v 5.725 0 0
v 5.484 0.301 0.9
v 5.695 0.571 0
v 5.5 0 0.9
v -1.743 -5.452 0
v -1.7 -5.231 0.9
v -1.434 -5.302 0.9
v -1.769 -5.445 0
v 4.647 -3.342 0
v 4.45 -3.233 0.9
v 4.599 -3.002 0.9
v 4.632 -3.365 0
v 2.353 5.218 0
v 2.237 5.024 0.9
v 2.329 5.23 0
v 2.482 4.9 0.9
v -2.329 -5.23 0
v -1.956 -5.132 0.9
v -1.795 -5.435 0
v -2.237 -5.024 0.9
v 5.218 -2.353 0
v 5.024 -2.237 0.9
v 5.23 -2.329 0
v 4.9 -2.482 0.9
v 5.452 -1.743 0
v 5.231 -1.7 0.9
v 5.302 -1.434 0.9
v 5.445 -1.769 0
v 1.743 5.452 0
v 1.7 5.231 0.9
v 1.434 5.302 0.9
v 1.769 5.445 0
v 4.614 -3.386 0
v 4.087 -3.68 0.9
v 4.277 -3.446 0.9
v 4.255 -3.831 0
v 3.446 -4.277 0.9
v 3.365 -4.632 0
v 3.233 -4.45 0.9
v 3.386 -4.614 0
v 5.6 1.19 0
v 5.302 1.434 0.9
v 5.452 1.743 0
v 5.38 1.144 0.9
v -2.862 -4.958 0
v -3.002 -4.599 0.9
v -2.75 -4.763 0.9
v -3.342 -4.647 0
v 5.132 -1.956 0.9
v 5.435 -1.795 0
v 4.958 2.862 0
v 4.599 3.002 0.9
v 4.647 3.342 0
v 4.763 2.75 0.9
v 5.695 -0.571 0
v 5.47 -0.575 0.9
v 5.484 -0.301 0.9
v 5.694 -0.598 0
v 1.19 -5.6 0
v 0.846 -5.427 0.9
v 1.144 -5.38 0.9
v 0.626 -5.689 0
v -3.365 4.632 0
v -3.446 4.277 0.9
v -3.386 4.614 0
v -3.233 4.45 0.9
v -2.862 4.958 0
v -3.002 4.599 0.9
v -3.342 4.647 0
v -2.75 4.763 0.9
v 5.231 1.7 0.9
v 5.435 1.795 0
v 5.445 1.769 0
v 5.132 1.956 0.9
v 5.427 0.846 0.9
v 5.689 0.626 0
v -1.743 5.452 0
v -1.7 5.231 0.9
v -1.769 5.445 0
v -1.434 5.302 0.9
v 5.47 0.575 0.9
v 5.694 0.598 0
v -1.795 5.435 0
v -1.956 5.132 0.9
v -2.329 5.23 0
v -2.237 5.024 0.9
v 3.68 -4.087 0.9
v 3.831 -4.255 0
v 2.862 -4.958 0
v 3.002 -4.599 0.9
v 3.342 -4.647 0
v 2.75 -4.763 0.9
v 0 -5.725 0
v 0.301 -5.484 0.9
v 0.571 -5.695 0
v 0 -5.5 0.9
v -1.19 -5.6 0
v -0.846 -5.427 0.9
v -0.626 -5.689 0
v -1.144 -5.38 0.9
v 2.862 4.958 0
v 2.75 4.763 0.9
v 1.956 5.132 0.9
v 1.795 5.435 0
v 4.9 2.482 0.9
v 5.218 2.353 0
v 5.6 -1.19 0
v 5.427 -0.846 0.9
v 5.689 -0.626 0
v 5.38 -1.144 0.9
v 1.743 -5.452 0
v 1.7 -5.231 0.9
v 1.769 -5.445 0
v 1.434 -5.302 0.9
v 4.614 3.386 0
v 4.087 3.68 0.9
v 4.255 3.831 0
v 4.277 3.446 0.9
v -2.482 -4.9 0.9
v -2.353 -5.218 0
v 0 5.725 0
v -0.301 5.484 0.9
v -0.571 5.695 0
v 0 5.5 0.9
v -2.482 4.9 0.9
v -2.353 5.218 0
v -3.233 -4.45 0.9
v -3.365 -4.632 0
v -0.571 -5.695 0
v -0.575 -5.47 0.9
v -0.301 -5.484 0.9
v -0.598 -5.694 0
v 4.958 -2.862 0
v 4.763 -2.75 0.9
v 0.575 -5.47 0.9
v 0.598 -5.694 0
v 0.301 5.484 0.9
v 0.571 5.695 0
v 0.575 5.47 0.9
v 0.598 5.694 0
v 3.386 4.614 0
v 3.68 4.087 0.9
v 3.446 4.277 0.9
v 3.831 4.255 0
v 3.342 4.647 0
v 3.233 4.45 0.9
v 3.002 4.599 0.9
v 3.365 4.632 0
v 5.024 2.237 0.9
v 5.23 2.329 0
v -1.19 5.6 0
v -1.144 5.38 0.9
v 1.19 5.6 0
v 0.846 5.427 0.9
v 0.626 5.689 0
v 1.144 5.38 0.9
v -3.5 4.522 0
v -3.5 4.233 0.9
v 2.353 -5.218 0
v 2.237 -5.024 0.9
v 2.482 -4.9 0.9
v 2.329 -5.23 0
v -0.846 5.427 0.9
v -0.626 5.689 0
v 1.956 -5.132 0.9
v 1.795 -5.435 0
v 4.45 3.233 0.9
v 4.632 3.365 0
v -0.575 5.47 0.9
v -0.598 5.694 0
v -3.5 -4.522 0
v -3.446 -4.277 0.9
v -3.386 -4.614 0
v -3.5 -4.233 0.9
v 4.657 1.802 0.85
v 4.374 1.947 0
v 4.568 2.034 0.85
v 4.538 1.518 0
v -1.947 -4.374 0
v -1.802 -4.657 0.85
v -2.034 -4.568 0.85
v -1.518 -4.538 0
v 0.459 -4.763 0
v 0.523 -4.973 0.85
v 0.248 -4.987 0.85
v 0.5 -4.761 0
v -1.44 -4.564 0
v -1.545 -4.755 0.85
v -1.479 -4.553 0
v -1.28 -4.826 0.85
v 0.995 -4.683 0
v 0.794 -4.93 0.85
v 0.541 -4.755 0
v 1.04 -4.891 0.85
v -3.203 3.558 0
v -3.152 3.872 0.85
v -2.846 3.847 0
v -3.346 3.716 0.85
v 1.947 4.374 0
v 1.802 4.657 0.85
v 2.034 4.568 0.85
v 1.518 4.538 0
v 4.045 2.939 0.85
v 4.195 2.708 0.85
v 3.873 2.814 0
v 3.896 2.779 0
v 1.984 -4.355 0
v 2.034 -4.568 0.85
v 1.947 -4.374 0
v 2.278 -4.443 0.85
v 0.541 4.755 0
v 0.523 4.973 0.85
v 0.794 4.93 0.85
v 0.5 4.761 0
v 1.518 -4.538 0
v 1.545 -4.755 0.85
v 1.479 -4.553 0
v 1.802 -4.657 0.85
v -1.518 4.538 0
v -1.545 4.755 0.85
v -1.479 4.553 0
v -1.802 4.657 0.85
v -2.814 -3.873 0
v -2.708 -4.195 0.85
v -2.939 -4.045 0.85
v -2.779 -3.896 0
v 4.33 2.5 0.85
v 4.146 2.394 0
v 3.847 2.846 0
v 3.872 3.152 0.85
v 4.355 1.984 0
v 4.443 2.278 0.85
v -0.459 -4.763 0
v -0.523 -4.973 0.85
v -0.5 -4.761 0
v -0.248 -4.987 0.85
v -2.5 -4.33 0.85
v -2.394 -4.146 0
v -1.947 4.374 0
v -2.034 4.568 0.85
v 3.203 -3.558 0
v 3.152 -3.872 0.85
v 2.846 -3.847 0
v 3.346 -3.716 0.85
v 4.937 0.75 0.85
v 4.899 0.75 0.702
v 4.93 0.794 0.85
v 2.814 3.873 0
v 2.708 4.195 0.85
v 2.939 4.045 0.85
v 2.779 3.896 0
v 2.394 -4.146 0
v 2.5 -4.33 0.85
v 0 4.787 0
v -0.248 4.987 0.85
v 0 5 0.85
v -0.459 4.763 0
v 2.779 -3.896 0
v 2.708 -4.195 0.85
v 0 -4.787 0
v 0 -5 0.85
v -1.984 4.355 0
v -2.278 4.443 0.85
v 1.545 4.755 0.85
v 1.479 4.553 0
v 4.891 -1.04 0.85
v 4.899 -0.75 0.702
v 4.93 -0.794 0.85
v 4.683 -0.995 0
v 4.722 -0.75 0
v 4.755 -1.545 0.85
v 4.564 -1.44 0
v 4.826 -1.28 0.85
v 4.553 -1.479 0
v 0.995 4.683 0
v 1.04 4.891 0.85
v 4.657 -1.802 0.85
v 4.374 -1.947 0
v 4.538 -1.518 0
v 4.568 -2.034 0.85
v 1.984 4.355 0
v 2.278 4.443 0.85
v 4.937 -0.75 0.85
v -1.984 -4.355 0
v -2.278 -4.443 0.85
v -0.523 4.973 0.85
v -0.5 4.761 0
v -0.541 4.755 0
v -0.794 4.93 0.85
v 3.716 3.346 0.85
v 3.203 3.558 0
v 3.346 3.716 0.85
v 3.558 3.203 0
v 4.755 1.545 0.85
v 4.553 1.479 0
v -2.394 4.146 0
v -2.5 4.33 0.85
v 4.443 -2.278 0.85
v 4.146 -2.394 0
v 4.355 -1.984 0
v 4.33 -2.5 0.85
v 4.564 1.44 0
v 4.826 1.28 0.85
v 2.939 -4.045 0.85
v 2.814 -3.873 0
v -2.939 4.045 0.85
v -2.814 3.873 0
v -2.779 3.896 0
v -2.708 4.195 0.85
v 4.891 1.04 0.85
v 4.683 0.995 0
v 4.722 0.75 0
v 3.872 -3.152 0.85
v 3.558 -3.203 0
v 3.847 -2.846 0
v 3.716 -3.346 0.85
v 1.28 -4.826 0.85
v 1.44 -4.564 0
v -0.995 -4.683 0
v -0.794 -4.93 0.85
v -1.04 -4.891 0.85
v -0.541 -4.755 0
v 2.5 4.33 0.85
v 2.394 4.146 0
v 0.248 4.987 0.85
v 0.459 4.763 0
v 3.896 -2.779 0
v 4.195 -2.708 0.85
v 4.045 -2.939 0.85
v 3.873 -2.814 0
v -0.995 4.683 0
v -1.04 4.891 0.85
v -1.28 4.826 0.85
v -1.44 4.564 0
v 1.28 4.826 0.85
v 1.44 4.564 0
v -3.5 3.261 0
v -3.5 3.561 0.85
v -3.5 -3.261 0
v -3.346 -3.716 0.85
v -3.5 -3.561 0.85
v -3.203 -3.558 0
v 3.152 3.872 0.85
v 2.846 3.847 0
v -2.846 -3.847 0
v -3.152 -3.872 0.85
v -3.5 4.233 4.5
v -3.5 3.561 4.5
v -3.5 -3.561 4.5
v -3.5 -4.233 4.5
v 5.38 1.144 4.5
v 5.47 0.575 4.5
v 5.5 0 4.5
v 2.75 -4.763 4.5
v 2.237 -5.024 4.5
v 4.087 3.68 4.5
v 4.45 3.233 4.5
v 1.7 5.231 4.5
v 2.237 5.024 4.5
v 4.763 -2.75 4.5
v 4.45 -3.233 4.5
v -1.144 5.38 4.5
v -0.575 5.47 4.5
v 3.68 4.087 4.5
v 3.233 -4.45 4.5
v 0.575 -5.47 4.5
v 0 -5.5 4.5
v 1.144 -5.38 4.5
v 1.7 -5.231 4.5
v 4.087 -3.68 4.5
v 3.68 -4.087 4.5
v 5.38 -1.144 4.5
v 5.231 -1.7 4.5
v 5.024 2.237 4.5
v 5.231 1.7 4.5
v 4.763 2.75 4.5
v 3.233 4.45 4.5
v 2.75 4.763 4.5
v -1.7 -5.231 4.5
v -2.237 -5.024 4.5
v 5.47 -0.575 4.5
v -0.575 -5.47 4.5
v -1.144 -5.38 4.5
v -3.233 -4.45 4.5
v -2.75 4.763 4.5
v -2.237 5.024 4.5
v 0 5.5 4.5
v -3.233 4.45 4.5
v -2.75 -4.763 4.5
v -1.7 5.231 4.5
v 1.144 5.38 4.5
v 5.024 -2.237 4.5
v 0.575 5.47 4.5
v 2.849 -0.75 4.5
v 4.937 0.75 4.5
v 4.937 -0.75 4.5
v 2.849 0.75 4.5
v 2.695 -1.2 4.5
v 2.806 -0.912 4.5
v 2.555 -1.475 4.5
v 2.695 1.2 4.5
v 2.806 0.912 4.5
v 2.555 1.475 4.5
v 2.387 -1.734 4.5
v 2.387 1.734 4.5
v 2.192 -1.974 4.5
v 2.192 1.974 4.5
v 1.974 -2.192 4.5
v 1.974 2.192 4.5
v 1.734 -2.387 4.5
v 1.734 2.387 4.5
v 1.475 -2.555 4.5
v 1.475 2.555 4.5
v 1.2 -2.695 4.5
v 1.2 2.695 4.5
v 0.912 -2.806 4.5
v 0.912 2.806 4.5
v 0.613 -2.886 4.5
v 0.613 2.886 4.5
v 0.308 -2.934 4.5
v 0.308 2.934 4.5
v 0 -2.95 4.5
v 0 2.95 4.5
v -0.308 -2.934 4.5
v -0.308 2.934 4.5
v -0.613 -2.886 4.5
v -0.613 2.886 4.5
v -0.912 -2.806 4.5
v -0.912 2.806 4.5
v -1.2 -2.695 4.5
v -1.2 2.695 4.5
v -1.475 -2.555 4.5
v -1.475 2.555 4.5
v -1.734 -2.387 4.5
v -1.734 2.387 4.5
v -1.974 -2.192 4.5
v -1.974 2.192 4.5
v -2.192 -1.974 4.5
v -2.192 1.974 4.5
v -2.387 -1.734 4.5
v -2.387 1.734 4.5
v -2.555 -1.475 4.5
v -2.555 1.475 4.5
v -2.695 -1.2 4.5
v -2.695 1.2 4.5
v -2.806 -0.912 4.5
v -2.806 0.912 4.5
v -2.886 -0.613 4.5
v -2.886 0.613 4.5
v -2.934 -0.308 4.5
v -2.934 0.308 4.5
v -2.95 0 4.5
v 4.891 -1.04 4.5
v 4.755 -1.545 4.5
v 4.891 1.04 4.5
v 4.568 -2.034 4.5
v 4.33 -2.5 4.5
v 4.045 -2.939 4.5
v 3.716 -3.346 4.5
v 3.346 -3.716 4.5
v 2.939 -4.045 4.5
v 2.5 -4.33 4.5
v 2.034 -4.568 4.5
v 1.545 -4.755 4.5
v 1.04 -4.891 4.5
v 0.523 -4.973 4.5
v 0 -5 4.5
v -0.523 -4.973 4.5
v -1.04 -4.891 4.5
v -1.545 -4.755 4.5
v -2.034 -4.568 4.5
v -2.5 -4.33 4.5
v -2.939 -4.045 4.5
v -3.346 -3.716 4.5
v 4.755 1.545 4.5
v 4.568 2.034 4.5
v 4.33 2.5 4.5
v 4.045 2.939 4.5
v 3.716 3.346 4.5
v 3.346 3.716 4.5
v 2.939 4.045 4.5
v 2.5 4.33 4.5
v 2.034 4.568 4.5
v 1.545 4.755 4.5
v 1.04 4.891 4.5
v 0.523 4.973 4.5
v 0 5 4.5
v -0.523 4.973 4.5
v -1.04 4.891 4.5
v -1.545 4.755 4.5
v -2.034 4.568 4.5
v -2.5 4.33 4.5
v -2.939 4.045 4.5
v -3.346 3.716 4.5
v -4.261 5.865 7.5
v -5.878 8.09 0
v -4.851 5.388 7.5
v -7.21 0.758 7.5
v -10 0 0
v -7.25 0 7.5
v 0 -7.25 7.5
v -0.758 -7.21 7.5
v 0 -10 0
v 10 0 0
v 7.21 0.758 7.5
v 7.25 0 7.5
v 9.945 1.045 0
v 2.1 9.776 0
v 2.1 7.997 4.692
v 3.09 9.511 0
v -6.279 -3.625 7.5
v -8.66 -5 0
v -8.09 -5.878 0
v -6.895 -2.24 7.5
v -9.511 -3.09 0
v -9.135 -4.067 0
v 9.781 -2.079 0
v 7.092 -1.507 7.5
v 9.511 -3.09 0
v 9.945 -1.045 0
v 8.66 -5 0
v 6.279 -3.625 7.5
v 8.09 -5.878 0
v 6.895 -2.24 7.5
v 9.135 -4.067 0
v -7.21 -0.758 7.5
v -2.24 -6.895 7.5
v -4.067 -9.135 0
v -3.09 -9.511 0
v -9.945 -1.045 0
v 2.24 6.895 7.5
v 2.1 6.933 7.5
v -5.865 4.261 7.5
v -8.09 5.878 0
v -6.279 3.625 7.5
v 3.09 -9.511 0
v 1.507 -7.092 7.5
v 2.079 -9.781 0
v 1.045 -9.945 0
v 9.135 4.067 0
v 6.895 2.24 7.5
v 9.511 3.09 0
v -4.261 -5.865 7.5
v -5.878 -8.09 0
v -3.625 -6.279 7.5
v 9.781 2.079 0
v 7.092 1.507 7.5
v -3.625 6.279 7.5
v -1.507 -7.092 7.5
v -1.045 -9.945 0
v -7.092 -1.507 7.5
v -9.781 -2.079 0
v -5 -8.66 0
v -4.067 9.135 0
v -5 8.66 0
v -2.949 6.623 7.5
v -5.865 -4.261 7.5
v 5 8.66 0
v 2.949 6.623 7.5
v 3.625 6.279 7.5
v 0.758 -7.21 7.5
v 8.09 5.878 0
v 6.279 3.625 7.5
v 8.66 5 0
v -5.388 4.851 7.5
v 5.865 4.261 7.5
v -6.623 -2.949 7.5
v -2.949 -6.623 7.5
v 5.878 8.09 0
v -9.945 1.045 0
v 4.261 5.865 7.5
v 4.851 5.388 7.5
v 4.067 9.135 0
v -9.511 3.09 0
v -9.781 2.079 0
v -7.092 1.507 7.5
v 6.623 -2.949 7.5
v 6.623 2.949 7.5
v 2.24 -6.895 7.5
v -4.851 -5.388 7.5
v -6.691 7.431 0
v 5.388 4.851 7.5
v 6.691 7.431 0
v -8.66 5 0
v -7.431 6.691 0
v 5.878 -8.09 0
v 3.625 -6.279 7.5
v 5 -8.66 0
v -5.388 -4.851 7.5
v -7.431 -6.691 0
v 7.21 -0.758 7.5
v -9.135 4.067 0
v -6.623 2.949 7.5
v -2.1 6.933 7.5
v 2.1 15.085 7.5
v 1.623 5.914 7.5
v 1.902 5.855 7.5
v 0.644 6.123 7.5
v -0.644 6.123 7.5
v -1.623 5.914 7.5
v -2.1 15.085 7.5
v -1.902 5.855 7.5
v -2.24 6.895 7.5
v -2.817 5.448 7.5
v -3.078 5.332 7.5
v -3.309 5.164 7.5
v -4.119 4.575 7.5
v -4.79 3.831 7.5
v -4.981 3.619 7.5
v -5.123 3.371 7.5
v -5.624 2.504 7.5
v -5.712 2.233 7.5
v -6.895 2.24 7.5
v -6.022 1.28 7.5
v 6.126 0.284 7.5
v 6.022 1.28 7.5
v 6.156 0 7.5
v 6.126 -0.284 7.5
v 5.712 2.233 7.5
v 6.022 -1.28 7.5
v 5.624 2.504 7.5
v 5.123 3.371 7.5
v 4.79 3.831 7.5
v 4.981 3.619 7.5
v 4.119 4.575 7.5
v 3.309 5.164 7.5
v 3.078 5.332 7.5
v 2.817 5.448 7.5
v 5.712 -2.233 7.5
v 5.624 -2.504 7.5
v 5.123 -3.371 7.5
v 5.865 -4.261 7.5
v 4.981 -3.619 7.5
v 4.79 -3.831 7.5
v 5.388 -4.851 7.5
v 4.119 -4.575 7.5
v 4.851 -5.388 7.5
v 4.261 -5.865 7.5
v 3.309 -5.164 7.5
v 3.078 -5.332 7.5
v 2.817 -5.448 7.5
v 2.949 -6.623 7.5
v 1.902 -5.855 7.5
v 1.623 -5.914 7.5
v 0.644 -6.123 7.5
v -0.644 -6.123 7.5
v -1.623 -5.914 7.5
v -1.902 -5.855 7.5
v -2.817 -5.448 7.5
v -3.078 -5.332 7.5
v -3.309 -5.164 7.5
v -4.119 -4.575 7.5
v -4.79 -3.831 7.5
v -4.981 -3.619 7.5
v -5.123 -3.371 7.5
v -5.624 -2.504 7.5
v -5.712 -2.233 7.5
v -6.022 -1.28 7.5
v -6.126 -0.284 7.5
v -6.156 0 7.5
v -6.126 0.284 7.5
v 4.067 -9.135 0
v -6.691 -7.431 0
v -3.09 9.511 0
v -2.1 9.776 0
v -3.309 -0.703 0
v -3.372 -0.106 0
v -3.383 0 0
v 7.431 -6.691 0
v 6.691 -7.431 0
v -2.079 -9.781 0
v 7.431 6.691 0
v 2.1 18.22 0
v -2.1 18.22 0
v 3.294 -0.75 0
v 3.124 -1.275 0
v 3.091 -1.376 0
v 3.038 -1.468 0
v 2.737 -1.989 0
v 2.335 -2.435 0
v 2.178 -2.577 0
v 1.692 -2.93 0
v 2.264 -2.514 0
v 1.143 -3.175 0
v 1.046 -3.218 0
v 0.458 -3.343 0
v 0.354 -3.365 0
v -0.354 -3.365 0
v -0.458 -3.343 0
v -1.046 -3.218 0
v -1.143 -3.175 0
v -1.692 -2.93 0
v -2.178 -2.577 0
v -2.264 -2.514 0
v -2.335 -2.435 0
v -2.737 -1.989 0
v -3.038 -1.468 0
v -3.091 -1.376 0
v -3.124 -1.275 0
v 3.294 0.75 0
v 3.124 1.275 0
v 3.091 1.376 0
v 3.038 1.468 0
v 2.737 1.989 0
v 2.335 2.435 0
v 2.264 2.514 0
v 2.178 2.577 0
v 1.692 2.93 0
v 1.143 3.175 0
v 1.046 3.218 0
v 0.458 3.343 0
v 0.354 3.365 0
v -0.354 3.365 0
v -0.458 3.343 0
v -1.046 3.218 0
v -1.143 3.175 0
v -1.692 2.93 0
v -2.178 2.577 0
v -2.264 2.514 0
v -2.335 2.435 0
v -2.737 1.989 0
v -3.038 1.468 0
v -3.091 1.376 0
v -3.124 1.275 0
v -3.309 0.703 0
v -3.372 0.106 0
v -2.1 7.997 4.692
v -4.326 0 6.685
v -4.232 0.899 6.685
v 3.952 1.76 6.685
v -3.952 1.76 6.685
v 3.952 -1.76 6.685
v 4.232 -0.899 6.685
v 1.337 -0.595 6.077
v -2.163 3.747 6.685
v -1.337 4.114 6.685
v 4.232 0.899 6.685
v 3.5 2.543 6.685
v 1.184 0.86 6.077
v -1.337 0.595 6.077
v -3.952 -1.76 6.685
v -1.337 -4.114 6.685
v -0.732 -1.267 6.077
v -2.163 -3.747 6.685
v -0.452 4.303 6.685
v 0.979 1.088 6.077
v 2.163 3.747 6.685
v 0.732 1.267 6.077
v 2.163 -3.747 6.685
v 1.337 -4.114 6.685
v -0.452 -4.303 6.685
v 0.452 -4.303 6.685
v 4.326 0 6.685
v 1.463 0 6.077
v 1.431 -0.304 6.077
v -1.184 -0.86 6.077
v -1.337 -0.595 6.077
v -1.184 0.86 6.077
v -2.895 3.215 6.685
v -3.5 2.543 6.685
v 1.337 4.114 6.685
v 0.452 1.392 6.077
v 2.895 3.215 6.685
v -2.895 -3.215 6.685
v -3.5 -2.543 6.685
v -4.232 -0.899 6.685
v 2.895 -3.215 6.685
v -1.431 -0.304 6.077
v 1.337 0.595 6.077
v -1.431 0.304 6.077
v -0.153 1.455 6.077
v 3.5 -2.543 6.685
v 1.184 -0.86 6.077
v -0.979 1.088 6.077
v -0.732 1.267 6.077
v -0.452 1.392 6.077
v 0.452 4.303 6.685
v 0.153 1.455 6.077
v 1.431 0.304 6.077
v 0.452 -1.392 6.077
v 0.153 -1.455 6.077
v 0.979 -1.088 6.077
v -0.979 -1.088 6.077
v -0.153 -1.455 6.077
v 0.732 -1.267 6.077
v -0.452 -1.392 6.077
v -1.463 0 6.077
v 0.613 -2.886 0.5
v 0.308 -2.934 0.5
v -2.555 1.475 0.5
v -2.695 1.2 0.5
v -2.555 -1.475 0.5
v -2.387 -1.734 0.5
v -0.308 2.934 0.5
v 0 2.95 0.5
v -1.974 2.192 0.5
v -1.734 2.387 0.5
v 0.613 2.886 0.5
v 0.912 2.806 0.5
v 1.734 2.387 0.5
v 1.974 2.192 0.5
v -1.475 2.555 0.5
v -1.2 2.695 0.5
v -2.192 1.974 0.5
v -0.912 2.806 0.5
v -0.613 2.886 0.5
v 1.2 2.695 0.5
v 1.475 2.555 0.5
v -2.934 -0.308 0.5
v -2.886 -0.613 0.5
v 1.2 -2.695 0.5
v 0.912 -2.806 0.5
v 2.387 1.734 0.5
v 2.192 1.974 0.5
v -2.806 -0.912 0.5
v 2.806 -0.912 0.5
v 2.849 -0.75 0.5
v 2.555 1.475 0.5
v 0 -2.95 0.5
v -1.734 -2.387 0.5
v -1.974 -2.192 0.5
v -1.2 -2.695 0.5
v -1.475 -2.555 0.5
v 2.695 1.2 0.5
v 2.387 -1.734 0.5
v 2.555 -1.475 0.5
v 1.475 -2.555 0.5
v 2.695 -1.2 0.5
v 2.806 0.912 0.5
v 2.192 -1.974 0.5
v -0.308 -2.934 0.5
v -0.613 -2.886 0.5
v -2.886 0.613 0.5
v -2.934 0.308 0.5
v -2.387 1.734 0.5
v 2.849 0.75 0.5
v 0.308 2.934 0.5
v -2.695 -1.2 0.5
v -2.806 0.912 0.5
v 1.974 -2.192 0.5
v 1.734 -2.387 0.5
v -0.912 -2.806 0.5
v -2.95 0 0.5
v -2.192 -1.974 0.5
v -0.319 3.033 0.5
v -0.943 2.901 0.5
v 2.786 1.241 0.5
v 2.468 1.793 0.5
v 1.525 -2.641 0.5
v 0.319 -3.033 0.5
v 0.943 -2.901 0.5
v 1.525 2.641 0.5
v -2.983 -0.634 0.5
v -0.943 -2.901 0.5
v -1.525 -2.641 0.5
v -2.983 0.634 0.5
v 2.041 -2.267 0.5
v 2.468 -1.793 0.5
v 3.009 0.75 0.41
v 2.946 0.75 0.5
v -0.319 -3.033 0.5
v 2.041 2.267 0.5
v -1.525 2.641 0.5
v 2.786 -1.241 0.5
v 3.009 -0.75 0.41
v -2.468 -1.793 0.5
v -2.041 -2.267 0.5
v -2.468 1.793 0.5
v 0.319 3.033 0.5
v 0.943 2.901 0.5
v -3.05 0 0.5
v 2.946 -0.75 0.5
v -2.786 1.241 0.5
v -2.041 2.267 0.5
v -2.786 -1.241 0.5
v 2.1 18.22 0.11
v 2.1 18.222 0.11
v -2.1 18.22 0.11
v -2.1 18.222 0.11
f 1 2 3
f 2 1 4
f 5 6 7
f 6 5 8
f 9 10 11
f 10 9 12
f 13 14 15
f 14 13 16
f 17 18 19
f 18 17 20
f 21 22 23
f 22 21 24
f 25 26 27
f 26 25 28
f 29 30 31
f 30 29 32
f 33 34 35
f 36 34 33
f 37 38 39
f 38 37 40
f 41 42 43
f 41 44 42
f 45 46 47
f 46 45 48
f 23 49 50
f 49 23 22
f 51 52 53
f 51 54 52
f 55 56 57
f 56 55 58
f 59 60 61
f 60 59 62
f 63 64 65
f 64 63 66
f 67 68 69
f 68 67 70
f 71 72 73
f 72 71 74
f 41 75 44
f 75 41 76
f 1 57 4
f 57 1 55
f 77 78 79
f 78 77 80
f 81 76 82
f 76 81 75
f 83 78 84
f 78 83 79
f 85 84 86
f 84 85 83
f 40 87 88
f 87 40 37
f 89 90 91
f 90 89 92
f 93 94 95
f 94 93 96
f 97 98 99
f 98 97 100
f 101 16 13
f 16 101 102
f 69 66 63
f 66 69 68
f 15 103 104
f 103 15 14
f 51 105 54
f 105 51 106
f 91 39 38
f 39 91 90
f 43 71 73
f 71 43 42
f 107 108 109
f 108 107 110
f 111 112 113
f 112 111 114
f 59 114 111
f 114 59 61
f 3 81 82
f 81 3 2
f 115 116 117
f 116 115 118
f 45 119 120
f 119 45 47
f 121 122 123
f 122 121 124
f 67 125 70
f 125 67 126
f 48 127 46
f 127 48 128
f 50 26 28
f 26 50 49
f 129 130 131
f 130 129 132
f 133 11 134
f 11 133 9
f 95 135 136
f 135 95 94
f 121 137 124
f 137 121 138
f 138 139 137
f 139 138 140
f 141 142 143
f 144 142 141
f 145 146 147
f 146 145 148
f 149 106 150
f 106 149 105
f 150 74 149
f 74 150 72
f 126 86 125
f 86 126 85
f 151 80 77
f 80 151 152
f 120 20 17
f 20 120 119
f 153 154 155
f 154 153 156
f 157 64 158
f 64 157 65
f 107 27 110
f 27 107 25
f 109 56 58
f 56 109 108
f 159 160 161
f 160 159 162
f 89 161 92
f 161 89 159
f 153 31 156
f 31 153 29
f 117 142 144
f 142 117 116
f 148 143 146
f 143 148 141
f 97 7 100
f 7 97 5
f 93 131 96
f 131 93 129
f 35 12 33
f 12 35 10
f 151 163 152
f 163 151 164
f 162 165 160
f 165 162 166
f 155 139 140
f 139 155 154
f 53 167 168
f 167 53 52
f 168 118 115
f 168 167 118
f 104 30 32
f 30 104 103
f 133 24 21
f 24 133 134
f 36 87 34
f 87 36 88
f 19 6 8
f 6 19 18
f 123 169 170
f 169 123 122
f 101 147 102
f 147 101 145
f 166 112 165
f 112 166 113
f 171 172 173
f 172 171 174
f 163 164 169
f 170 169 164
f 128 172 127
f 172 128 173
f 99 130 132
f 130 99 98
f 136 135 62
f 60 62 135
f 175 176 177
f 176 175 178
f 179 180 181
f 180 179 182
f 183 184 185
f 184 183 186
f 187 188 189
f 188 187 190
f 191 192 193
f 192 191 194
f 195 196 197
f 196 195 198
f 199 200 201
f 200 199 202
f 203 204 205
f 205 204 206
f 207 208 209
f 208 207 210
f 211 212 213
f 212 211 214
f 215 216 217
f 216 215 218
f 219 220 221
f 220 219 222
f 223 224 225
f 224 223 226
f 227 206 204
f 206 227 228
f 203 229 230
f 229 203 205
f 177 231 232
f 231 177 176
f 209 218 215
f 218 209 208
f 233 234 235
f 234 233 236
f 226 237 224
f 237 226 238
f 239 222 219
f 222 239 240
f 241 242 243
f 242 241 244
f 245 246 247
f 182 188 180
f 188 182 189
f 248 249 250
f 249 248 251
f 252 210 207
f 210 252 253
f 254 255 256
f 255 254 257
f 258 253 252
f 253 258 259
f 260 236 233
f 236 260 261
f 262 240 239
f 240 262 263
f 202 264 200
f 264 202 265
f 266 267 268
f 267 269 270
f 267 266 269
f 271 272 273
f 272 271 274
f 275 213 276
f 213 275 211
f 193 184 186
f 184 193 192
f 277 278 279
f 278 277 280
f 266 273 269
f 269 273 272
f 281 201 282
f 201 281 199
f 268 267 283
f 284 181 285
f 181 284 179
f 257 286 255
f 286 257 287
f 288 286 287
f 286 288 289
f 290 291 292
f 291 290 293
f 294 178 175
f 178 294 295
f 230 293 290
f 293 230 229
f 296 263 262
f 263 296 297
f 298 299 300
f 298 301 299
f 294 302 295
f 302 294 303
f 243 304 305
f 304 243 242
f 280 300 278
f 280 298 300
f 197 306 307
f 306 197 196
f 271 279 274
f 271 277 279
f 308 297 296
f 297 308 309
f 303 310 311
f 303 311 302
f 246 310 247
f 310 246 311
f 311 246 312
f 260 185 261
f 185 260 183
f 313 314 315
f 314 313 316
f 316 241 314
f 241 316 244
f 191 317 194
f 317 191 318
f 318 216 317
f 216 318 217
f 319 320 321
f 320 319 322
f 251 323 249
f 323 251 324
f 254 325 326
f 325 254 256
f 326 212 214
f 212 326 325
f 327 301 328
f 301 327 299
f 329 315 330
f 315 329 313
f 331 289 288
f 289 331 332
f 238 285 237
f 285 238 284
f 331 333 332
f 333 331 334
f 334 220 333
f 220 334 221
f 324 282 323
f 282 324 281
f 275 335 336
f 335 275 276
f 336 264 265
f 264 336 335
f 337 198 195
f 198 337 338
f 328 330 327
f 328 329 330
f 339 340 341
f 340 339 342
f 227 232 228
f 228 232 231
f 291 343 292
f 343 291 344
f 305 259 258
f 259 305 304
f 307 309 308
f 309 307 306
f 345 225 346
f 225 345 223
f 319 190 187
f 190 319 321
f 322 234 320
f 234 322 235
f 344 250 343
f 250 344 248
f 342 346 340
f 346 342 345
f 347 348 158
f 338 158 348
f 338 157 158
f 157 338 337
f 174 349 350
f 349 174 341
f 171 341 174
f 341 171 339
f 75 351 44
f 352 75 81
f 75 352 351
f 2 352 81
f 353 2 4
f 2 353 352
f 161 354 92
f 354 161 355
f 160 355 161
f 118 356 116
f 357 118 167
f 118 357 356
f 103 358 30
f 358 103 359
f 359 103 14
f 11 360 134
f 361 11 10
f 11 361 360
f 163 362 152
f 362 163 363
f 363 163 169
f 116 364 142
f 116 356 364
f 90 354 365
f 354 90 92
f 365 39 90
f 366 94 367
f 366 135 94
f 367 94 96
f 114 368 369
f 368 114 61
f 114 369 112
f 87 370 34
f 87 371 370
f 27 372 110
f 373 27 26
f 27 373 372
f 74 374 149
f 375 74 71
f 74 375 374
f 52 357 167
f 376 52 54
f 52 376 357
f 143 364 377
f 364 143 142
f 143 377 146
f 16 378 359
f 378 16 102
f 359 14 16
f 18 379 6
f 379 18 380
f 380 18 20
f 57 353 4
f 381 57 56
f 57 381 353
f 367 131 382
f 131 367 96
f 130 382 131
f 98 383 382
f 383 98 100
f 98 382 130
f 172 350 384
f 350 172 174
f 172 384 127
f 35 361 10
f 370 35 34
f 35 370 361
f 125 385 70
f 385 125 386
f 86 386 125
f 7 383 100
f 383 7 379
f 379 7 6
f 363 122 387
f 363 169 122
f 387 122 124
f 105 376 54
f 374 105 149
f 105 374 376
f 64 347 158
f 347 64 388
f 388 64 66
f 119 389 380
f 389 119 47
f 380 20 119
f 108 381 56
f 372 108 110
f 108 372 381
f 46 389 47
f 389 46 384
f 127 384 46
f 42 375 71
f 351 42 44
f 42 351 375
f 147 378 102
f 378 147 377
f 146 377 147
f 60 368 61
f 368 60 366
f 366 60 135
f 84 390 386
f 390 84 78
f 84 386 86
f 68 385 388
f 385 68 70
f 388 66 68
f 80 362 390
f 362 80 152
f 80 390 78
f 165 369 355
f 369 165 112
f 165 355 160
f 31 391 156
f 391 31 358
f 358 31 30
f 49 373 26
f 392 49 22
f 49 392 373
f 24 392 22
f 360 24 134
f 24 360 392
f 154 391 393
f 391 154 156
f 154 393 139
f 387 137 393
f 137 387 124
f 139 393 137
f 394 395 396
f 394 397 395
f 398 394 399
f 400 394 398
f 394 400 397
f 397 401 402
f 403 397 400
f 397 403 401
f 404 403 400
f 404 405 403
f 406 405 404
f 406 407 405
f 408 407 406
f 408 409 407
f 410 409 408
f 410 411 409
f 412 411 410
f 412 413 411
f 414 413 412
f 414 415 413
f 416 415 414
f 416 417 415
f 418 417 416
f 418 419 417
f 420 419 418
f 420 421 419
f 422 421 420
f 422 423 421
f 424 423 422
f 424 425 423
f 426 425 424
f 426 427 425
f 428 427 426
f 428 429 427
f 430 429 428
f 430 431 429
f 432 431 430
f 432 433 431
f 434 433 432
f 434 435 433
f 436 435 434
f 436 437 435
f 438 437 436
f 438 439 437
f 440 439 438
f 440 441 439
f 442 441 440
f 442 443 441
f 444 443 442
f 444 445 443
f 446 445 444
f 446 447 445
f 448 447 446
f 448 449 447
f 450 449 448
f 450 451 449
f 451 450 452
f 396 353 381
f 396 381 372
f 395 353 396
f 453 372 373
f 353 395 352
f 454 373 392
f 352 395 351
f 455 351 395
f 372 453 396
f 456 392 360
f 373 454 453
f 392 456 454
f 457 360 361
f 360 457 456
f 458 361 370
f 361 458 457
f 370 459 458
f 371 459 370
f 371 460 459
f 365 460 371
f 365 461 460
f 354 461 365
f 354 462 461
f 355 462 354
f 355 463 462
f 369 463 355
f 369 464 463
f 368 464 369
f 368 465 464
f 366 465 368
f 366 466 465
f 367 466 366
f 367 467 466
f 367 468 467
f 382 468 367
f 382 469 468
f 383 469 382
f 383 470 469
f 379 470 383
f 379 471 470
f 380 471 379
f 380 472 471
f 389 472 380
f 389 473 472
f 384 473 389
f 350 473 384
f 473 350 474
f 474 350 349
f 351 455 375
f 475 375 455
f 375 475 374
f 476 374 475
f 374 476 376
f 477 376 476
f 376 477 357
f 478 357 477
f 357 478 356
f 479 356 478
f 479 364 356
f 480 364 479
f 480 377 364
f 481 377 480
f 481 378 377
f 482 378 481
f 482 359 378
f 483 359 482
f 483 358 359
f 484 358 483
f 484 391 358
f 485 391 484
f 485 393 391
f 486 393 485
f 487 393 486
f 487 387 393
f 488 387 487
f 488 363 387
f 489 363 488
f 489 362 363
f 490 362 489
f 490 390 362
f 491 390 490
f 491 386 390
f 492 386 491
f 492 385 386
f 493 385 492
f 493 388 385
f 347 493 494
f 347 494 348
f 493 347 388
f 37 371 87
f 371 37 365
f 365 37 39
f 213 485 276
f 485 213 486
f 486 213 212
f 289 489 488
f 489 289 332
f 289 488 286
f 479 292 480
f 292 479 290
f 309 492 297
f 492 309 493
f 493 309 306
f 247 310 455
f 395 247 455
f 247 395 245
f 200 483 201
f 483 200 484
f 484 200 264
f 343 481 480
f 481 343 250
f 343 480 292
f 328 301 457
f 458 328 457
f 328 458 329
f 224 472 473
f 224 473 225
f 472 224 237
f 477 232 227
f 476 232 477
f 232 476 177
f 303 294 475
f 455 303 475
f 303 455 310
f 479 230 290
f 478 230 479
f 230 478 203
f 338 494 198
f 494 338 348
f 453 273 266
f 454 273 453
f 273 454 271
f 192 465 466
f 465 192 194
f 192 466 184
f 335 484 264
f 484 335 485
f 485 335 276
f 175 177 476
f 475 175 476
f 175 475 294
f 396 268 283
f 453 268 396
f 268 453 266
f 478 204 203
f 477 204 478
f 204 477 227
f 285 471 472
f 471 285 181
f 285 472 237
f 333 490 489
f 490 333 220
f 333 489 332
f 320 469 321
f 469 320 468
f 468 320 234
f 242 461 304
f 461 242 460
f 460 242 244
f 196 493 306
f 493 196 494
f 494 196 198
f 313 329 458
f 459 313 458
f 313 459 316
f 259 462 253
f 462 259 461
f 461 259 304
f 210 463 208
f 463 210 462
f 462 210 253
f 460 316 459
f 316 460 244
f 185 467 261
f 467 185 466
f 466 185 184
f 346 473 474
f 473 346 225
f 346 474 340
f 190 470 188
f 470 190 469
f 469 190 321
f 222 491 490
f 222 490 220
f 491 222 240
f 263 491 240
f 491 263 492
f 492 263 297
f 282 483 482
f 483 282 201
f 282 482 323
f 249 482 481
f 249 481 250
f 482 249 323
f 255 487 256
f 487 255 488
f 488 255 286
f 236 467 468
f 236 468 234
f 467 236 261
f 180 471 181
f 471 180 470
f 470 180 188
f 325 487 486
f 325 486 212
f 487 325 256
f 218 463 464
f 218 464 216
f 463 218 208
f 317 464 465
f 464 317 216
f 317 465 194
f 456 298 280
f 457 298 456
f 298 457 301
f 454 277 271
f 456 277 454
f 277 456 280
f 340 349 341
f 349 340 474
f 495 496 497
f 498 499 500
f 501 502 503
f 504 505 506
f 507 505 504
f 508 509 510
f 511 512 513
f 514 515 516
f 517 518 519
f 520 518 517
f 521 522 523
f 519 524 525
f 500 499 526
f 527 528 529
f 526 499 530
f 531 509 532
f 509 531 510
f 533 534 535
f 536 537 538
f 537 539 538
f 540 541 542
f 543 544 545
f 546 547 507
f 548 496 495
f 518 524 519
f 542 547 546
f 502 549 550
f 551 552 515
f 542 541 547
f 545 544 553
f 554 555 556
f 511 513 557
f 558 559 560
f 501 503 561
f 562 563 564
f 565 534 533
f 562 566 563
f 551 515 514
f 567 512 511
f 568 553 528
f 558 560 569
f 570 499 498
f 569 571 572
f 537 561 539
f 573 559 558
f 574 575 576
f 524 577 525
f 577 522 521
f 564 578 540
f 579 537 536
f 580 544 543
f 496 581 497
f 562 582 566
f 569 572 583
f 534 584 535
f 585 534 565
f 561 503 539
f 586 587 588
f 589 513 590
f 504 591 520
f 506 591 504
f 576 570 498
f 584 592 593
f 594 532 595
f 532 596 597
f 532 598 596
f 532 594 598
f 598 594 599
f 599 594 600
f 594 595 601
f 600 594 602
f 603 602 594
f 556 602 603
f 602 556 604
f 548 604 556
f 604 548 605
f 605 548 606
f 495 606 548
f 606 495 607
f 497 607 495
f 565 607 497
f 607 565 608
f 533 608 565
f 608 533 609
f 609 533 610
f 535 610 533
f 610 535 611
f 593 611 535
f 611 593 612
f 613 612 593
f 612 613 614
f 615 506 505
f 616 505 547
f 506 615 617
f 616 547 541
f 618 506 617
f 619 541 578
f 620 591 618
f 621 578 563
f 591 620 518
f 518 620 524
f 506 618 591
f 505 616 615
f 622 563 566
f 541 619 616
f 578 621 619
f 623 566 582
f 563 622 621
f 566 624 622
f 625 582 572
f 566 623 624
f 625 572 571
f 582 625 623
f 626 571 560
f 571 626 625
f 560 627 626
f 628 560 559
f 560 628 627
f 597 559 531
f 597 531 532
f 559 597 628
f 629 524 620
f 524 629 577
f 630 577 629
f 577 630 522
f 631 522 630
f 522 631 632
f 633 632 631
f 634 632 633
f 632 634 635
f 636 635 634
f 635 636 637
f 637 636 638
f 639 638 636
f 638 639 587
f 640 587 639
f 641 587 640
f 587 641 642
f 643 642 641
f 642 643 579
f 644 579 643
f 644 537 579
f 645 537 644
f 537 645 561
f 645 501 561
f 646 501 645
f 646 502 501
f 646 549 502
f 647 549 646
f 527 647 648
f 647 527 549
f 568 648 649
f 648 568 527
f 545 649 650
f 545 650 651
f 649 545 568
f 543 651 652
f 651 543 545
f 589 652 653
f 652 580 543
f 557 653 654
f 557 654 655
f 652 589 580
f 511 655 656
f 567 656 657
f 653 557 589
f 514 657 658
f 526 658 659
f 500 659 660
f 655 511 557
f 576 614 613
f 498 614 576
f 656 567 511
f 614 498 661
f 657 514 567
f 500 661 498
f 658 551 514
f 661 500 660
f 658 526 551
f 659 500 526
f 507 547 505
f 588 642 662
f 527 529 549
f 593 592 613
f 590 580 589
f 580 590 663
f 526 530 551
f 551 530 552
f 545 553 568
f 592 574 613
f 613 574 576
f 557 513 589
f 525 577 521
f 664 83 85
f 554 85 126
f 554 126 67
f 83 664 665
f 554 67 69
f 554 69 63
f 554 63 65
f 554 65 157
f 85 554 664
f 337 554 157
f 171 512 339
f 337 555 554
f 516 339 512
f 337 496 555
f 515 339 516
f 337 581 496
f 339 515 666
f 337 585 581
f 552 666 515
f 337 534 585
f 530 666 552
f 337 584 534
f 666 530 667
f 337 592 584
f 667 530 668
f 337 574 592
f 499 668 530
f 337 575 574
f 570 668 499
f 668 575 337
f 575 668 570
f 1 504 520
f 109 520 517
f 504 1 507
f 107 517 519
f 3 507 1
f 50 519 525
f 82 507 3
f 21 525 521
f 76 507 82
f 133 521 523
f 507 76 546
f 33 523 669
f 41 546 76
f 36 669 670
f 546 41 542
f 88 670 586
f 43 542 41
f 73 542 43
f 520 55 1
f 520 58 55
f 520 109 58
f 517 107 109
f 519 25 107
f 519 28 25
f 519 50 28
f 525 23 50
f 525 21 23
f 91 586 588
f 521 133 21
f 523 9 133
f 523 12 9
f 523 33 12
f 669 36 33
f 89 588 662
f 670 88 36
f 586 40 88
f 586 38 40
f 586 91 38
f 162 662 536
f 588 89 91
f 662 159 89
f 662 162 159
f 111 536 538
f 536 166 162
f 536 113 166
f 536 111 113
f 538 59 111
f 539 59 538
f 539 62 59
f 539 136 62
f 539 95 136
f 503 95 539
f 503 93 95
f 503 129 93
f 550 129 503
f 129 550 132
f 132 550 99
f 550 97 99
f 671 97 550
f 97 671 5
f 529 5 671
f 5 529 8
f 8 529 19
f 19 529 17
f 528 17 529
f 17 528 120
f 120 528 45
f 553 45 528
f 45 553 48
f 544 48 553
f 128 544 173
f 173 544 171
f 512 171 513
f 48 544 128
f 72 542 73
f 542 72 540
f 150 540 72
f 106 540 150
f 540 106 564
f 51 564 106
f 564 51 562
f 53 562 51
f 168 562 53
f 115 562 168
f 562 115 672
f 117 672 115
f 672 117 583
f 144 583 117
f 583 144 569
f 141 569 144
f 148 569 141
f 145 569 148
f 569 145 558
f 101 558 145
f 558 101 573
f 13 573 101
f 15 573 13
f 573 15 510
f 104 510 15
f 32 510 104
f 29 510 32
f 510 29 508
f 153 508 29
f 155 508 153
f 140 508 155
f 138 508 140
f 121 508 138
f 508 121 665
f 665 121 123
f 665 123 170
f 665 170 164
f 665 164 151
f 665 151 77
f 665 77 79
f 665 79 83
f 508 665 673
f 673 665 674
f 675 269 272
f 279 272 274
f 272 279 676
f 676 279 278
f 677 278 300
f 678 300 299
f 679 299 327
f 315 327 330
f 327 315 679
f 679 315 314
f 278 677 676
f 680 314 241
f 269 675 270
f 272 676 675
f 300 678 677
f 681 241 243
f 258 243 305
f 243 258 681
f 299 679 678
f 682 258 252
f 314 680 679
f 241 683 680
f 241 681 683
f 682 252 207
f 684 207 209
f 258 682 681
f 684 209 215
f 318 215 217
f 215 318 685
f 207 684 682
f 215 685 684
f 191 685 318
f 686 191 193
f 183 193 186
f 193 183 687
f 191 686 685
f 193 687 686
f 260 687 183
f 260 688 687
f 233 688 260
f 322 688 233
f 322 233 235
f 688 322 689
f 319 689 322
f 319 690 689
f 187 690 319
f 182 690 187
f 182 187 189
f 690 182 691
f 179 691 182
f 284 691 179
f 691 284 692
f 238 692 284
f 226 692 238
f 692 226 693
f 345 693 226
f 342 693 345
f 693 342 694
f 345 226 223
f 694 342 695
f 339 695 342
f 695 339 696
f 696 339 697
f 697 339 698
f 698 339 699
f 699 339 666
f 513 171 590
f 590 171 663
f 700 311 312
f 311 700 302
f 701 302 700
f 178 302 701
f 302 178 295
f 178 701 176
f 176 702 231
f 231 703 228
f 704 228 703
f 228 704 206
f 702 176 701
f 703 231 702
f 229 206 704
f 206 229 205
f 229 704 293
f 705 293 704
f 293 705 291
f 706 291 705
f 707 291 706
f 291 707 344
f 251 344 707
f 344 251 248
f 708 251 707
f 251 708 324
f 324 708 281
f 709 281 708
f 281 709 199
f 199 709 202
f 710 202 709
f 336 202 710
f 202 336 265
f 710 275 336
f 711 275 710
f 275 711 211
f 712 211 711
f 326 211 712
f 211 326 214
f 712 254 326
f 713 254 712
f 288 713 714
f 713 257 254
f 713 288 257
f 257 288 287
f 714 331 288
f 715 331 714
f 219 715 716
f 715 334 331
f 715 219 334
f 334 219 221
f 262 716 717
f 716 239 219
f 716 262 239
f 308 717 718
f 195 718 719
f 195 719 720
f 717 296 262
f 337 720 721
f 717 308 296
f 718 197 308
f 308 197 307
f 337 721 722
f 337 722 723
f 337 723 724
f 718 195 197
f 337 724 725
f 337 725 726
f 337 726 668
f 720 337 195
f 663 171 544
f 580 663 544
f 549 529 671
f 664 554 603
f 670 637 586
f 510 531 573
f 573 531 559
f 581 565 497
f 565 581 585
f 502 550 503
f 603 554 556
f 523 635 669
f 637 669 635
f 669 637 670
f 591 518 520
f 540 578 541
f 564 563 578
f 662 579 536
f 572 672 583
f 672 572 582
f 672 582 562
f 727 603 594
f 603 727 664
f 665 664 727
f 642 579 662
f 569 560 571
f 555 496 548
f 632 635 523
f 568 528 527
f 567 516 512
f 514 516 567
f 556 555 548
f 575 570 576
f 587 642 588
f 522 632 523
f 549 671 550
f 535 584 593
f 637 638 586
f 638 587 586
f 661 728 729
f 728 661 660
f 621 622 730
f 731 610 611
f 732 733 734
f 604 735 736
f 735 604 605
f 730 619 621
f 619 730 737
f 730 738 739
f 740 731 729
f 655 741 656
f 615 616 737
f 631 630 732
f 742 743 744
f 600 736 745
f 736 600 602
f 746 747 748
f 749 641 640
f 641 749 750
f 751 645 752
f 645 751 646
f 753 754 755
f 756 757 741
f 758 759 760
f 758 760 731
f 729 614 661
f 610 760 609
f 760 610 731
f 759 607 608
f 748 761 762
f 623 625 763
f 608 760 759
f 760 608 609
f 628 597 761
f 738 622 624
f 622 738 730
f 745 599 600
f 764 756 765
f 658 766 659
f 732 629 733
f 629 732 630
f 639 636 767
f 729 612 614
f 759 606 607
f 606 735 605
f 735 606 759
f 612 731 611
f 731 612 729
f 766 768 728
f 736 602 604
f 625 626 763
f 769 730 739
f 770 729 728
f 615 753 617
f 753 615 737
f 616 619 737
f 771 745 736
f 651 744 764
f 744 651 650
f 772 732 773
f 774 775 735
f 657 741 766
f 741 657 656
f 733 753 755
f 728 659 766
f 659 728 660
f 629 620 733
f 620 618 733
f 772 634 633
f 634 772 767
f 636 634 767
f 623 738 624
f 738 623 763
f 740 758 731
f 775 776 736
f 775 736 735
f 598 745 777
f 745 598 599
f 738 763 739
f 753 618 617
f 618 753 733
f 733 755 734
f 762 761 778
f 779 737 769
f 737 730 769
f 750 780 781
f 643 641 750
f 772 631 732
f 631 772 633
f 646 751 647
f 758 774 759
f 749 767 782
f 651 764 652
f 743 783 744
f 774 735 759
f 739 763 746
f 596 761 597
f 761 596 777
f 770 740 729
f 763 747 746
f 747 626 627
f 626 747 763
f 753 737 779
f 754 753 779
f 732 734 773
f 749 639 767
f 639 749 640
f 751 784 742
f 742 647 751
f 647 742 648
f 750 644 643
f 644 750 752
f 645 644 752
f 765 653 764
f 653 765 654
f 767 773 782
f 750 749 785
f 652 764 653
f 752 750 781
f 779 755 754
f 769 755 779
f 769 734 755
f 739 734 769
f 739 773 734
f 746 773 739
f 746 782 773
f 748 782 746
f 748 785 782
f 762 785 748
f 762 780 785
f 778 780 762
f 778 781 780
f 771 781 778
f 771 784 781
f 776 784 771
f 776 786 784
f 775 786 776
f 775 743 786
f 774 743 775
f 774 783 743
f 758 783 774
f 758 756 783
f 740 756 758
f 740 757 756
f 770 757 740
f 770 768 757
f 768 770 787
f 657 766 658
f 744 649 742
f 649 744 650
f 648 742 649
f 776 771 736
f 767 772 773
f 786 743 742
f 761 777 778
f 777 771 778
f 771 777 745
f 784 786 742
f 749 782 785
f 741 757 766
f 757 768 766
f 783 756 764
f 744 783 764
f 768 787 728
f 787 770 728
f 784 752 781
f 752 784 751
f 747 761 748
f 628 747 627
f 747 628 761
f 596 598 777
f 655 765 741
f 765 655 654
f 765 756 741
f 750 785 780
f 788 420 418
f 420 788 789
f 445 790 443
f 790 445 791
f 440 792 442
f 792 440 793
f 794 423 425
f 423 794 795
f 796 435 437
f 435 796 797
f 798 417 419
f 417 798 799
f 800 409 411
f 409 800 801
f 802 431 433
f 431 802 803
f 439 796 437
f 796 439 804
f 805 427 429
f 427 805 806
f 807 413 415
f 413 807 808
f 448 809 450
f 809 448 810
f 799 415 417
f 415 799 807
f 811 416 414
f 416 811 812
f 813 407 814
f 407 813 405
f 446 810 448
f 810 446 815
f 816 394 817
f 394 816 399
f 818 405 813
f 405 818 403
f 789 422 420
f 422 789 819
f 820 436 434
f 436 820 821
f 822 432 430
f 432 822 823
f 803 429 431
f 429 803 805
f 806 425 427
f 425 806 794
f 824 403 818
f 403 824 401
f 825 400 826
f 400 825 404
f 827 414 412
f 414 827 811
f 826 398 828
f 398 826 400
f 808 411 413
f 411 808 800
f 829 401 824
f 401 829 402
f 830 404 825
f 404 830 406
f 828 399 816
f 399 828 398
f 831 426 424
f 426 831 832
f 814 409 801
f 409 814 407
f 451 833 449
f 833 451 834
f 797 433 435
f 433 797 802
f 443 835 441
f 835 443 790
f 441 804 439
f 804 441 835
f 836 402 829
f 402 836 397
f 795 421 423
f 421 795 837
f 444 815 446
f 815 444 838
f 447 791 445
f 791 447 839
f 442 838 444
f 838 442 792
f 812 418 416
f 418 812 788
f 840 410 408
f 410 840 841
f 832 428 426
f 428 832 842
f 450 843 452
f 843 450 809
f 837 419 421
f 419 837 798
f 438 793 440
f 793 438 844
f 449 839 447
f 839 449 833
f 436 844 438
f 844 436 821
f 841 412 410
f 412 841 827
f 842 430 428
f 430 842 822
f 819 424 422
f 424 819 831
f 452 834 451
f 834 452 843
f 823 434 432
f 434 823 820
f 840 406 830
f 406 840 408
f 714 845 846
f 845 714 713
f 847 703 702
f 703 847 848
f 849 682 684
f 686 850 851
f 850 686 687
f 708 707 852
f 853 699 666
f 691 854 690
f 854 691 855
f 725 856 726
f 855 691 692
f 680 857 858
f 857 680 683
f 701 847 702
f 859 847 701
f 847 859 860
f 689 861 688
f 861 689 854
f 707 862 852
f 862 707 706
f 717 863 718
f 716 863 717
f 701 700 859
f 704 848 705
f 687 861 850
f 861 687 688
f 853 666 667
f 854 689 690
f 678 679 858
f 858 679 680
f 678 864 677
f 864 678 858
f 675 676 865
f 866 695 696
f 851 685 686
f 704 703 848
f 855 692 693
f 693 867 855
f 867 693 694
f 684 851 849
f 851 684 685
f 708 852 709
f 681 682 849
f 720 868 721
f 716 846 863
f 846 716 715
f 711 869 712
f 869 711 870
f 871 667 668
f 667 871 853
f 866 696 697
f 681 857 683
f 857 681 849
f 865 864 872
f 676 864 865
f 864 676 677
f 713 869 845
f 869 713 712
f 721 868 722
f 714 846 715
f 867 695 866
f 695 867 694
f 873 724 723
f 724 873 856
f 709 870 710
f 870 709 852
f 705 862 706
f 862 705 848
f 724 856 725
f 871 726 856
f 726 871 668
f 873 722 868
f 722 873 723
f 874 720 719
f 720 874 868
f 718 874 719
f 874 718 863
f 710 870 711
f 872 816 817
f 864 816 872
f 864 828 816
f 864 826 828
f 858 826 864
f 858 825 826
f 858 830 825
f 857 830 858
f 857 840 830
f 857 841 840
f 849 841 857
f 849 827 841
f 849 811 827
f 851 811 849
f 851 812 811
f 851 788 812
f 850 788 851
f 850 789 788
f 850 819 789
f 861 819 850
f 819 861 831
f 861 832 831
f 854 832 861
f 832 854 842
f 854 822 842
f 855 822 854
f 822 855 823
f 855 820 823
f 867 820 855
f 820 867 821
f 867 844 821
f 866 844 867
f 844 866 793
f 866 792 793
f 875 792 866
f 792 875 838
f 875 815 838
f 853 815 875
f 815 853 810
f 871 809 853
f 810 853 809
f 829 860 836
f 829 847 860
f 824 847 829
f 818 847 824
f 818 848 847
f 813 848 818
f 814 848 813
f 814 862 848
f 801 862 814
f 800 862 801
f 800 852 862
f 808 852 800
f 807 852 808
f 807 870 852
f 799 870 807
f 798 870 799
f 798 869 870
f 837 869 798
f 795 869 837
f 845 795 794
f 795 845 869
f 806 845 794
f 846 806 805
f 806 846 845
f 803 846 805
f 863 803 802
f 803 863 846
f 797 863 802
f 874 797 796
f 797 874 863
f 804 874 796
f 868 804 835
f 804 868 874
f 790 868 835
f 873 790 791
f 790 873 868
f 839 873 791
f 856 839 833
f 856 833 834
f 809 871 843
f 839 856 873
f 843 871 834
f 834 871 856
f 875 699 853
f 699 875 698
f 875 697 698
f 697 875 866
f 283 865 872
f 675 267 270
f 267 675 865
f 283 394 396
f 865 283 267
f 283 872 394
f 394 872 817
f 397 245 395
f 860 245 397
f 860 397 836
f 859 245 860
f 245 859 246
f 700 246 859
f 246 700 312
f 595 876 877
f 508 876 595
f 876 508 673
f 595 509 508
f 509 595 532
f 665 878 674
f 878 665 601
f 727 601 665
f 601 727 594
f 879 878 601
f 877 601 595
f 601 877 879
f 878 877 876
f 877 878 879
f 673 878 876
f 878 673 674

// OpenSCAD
// PRUSA iteration3
// LCD Knob
// GNU GPL v3
// Josef Průša <iam@josefprusa.cz> and contributors
// http://www.reprap.org/wiki/Prusa_Mendel
// http://prusamendel.org

difference () {

// main body

translate([0,0,0]) rotate(a=[0,0,0]) cylinder(h = 7.5, r1=10, r=7.25, $fn=60);

translate([0,0,20]) rotate(a=[0,0,0]) sphere(14);

// knob cutout
translate([0,0,-0.1]) rotate(a=[0,0,0]) cylinder(h = 4.6, d=5.9, $fn=60);
    
translate([0,0,-0.1]) rotate(a=[0,0,0]) cylinder(h = 0.6, d1=6.9, d2=6.1 , $fn=30); 
    
translate([0,0.75,-0.1]) rotate(a=[0,0,-90]) cube([1.5,5.3,4.6]);

// first layer correction
union () {

difference (){    
translate([0,0,-0.1]) rotate(a=[0,0,0]) cylinder(h = 2,d1= 11.5, d2=10.5, $fn=60);
translate([0,0,-0.15]) rotate(a=[0,0,0]) cylinder(h = 2,d1= 9.5, d2=10.5, $fn=60);
translate([0,0,1]) rotate(a=[0,0,0]) cylinder(h = 2,d= 13, $fn=30);
    translate([-13.5,-6,-0.1]) rotate(a=[0,0,0]) cube([10,12,4.6]);
}
}      
    

difference () {

translate([0,0,-0.1]) rotate(a=[0,0,0]) cylinder(h = 4.6, d=11, $fn=60);
translate([0,0,-0.1]) rotate(a=[0,0,0]) cylinder(h = 4.6, d= 10, $fn=60);
translate([-13.5,-6,-0.1]) rotate(a=[0,0,0]) cube([10,12,4.6]);
    
    }    
    
    
    
    }

// handle
 
difference () {

translate([-2.1,6.5,0]) rotate(a=[0,0,0]) cube([4.2,12,7.5]);
translate([-2.5,15,7.7]) rotate(a=[-67,0,0]) cube([5.5,11,7.5]);
translate([-2.2,18.22,-0.1]) rotate(a=[0,0,0]) cube([4.4,12,0.21]);    
    
}
